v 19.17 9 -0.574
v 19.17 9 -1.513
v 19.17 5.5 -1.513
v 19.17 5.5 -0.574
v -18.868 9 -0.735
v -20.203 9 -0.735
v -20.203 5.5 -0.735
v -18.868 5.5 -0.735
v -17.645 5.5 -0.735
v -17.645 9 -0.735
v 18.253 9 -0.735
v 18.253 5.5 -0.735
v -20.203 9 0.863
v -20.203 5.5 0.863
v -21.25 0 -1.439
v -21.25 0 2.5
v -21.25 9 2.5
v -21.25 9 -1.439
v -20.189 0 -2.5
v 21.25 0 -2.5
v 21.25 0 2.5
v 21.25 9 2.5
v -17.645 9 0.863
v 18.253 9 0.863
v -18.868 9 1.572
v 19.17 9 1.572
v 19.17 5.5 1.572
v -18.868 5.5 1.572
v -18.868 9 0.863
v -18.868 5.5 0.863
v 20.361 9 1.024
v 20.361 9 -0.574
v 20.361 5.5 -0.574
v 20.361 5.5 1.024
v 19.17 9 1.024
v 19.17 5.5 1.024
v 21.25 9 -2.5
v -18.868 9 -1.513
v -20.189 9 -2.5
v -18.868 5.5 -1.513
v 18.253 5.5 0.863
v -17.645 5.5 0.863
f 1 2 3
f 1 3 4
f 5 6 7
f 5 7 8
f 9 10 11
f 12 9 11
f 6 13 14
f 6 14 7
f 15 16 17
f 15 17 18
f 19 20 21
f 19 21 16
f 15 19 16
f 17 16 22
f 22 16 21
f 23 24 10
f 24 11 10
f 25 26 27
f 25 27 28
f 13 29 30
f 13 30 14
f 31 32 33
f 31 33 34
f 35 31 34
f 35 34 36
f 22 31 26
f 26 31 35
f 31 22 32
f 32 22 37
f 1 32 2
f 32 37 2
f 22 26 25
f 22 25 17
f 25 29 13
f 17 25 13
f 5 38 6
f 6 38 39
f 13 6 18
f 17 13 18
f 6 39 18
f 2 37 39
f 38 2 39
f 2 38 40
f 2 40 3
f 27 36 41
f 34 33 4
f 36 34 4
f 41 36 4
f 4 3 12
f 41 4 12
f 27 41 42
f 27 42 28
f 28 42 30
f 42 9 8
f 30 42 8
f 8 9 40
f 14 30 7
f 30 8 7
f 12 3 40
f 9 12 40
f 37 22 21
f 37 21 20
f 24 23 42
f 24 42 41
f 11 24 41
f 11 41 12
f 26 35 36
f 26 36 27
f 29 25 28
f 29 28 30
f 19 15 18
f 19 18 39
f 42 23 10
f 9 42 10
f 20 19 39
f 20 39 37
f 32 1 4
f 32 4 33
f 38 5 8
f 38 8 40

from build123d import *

# Parameters (mm, degrees)
SV_DEPTH           = 9
SKETCH3_W          = 35.897762959
SKETCH3_H          = 1.597828601
CUT_EXTRUDE1_DEPTH = 3.5


with BuildPart() as part:
    # Sketch1 → SV (new body)
    with BuildSketch(Plane(origin=(0, 0, 0), x_dir=(1, 0, 0), z_dir=(0, 1, 0))):
        Polygon((-20.189, 2.5), (21.25, 2.5), (21.25, -1.44), (21.25, -2.5), (20.19, -2.5), (-21.25, -2.5), (-21.25, 1.439), align=None)
    extrude(amount=SV_DEPTH)

    # Sketch3 → Cut-Extrude1 (cut)
    with BuildSketch(Plane(origin=(0, 9, 0), x_dir=(1, 0, 0), z_dir=(0, 1, 0))):
        Polygon((-20.202517392, 0.734832739), (-18.867516597, 0.734832739), (-18.867516597, 1.51327079), (19.169882457, 1.51327079), (19.169882457, 0.573528463), (20.36118295, 0.573528463), (20.36118295, -1.024300139), (19.169882457, -1.024300139), (19.169882457, -1.572342426), (-18.867516597, -1.572342426), (-18.867516597, -0.862995862), (-20.202517392, -0.862995862), align=None)
        with Locations((0.304154287, -0.064081561)):
            Rectangle(SKETCH3_W, SKETCH3_H, mode=Mode.SUBTRACT)
    extrude(amount=-CUT_EXTRUDE1_DEPTH, mode=Mode.SUBTRACT)


solid = part.part
